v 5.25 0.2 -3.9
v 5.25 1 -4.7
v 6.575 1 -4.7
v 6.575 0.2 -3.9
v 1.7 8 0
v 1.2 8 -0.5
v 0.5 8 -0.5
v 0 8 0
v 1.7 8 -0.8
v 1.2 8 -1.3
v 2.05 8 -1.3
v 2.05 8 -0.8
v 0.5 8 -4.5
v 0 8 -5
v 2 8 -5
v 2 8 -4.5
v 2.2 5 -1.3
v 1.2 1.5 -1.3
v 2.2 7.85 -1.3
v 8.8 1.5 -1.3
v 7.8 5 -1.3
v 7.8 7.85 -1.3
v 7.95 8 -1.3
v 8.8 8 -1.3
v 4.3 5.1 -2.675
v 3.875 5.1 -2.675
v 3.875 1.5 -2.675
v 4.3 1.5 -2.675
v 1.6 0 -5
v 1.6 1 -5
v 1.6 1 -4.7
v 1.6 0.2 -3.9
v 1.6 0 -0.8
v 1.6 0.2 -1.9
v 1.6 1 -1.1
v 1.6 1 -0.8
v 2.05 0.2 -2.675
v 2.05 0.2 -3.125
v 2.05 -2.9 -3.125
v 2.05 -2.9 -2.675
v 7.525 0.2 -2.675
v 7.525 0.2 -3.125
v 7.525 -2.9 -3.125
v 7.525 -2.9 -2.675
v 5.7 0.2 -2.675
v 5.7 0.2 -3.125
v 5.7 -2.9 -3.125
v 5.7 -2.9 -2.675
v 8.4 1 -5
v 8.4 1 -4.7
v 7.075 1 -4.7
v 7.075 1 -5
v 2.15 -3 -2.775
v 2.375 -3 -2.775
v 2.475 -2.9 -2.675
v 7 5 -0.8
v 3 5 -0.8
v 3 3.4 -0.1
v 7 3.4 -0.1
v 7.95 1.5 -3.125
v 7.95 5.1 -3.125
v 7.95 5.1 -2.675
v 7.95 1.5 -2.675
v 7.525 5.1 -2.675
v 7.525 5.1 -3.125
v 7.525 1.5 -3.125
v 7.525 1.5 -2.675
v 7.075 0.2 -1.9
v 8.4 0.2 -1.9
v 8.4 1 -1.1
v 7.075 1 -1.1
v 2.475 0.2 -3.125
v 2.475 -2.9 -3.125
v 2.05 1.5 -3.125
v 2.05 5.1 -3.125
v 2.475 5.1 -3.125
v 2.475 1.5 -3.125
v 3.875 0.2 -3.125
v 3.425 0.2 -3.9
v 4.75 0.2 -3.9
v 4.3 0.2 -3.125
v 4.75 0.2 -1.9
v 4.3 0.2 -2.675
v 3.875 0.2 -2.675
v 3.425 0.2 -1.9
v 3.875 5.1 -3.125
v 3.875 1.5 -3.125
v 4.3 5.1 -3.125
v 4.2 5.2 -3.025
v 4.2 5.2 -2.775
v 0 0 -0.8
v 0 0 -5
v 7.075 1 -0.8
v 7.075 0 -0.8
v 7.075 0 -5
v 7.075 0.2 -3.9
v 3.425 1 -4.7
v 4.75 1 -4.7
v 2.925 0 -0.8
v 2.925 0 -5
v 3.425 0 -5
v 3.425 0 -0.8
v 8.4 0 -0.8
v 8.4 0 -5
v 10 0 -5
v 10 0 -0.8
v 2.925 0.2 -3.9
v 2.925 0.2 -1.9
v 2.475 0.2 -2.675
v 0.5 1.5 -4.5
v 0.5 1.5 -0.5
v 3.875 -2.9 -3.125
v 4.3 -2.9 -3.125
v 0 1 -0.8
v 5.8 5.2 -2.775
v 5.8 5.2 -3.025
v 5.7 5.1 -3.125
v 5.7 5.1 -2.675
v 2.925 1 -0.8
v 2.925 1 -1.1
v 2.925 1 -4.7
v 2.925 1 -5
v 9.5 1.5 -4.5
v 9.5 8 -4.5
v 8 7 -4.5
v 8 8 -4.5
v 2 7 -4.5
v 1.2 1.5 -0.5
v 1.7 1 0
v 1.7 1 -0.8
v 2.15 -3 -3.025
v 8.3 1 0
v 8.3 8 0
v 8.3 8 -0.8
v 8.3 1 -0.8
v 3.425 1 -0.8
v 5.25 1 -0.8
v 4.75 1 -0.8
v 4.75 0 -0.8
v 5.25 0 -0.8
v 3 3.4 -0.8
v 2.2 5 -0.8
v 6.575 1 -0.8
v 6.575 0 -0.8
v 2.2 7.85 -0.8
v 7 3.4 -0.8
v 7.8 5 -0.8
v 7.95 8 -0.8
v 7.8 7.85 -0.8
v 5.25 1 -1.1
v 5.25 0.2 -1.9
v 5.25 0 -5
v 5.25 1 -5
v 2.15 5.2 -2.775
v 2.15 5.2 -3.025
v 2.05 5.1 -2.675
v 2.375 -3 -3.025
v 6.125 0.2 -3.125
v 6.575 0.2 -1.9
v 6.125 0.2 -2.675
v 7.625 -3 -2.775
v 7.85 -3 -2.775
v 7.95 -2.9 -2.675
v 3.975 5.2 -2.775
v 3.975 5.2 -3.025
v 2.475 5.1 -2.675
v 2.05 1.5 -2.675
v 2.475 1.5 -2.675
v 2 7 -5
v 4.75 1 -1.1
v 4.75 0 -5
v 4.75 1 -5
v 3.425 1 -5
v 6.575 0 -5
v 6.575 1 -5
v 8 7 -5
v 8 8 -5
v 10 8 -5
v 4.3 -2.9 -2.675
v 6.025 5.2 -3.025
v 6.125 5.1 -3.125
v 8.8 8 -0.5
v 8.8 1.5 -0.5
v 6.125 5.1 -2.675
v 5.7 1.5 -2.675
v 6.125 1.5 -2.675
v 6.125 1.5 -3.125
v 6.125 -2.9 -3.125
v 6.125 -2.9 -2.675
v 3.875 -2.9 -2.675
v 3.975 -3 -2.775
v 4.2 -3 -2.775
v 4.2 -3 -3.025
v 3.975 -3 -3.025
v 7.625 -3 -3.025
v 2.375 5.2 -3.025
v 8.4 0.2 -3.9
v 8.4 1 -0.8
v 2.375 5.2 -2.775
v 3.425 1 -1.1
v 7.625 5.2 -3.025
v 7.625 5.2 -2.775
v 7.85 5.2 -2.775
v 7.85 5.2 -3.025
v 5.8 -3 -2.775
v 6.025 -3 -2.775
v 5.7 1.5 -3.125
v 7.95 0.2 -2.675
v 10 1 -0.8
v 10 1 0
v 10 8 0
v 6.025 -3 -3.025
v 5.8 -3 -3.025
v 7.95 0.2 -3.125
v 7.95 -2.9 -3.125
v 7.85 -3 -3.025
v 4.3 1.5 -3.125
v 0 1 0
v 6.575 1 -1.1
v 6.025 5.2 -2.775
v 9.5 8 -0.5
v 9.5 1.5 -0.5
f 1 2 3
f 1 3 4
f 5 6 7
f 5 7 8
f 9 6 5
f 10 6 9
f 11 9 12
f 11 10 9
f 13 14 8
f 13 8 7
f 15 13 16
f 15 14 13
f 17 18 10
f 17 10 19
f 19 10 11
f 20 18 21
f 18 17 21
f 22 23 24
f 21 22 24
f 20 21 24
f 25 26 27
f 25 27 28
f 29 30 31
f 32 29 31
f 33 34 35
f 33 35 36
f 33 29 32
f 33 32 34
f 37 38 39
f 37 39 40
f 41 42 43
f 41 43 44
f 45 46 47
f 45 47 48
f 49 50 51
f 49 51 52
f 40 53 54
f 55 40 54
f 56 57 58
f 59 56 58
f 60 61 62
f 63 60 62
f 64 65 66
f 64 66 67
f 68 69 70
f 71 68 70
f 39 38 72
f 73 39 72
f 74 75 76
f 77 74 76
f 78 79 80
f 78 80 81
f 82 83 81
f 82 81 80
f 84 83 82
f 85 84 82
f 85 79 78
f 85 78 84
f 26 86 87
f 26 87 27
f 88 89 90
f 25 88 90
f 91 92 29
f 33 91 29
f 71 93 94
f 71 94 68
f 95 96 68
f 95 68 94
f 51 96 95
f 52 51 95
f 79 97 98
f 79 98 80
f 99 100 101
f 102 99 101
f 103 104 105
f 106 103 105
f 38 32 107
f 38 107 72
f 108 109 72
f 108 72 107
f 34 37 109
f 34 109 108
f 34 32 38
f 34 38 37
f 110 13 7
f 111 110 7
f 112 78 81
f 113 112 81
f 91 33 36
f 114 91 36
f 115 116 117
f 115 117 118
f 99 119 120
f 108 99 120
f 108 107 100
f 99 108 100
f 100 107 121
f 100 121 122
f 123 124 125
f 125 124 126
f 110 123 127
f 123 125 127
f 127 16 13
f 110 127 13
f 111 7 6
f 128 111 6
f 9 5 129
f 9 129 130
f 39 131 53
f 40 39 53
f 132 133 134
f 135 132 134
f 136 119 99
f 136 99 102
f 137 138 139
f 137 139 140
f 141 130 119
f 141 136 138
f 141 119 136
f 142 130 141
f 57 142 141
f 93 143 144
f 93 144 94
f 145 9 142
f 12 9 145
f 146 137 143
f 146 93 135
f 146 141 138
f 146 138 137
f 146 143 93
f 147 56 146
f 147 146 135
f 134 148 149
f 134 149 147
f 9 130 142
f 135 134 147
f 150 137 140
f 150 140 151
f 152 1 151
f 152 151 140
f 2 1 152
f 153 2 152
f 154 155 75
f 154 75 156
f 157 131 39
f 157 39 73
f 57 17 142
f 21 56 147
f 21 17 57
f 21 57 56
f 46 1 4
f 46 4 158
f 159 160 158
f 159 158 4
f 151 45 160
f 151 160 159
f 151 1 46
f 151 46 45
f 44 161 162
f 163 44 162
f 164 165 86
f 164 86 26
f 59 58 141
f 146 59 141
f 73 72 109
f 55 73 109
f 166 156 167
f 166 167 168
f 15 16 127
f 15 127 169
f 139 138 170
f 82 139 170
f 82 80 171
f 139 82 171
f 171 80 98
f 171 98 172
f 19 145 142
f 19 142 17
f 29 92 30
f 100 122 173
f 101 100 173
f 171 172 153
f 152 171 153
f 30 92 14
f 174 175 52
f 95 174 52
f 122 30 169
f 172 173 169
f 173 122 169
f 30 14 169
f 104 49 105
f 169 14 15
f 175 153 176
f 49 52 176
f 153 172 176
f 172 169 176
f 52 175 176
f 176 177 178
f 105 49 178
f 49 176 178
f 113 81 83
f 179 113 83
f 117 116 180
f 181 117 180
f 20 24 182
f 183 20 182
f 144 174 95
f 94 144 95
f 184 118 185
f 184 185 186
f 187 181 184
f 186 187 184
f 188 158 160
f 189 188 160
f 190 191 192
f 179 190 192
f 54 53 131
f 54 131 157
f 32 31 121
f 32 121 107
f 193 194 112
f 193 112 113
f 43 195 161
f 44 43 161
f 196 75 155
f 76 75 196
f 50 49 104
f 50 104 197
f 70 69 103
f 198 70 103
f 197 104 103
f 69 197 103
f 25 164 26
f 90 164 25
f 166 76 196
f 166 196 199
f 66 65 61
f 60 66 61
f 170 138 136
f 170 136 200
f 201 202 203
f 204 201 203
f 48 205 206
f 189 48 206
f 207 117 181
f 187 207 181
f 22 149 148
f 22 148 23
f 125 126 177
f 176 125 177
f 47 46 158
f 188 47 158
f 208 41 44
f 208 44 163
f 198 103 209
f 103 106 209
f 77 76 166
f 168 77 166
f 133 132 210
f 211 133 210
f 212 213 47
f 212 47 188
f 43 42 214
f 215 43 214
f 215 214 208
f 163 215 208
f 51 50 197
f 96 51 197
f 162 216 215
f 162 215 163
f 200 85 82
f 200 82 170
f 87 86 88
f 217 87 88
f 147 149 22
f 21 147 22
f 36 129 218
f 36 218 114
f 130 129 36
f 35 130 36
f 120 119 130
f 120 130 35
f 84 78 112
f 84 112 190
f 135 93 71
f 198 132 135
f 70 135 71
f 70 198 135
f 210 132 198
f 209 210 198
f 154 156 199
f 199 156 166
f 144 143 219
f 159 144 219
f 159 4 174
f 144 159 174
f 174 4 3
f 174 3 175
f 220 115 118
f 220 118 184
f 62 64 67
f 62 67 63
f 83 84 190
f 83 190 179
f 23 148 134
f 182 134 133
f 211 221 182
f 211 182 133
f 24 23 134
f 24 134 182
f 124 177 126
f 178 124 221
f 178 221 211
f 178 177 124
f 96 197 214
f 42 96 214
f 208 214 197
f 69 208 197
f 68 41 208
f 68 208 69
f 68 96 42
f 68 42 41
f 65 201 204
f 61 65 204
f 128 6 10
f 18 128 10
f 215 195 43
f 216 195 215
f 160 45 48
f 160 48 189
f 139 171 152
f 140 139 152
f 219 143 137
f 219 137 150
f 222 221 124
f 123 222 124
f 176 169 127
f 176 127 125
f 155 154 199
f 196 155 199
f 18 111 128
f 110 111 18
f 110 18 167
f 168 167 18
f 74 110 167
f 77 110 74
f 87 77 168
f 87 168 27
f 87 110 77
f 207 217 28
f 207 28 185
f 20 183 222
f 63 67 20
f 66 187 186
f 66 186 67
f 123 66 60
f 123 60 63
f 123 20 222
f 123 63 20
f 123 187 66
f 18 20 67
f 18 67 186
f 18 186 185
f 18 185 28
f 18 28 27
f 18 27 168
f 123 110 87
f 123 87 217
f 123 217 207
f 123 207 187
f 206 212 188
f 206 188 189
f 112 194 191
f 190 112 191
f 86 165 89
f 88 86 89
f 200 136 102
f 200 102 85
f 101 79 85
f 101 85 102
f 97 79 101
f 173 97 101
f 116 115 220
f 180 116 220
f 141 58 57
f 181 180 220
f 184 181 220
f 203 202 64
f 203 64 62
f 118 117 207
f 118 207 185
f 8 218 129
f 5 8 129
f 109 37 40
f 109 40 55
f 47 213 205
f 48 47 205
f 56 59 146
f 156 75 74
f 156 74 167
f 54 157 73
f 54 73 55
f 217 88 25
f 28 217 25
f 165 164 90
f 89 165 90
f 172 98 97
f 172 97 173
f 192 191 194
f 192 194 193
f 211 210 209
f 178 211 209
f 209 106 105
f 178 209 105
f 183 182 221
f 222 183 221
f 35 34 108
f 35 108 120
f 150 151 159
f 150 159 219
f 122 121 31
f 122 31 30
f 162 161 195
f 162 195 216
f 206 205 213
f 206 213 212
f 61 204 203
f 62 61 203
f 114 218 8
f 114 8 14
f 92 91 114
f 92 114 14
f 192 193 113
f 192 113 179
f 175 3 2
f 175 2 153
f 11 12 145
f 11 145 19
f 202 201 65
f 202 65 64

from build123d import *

# Parameters (mm, degrees)
ESQUISSE1_W             = 10
ESQUISSE1_H             = 5
BOSS_EXTRU_1_DEPTH      = 8
ESQUISSE2_W             = 6.6
ESQUISSE2_H             = 0.8
ENL_V_MAT_EXTRU_1_DEPTH = 8
ENL_V_MAT_EXTRU_2_DEPTH = 6.5
ESQUISSE5_W             = 6
ESQUISSE5_H             = 0.5
ENL_V_MAT_EXTRU_3_DEPTH = 1
ESQUISSE6_W             = 5.6
ESQUISSE6_H             = 0.5
ENL_V_MAT_EXTRU_4_DEPTH = 3
ESQUISSE7_W             = 0.8
ESQUISSE7_H             = 1
ENL_V_MAT_EXTRU_5_DEPTH = 10
ESQUISSE8_W             = 6.8
ESQUISSE8_H             = 4.2
ENL_V_MAT_EXTRU_6_DEPTH = 1
BOSS_EXTRU_2_DEPTH      = 6.8
BOSS_EXTRU_3_DEPTH      = 2
BOSS_EXTRU_3_DEPTH_BACK = 2
ESQUISSE12_W            = 0.5
ESQUISSE12_H            = 4.2
BOSS_EXTRU_4_DEPTH      = 1
CHANFREIN1_SIZE         = 0.15
BOSS_EXTRU_5_DEPTH      = 3.2
BOSS_EXTRU_5_DEPTH_BACK = 5
ESQUISSE13_W            = 0.425
ESQUISSE13_H            = 0.45
CHANFREIN2_SIZE         = 0.1


with BuildPart() as part:
    # Esquisse1 → Boss.-Extru.1 (new body)
    with BuildSketch(Plane(origin=(0, 0, 0), x_dir=(1, 0, 0), z_dir=(0, 1, 0))):
        with Locations((5, 2.5)):
            Rectangle(ESQUISSE1_W, ESQUISSE1_H)
    extrude(amount=BOSS_EXTRU_1_DEPTH)

    # Esquisse2 → Enlèv. mat.-Extru.1 (cut)
    with BuildSketch(Plane(origin=(0, 8, 0), x_dir=(1, 0, 0), z_dir=(0, 1, 0))):
        with Locations((5, 0.4)):
            Rectangle(ESQUISSE2_W, ESQUISSE2_H)
    extrude(amount=-ENL_V_MAT_EXTRU_1_DEPTH, mode=Mode.SUBTRACT)

    # Esquisse4 → Enlèv. mat.-Extru.2 (cut)
    with BuildSketch(Plane(origin=(0, 8, 0), x_dir=(1, 0, 0), z_dir=(0, 1, 0))):
        Polygon((0.5, 0.5), (1.2, 0.5), (1.2, 1.3), (8.8, 1.3), (8.8, 0.5), (9.5, 0.5), (9.5, 4.5), (0.5, 4.5), align=None)
    extrude(amount=-ENL_V_MAT_EXTRU_2_DEPTH, mode=Mode.SUBTRACT)

    # Esquisse5 → Enlèv. mat.-Extru.3 (cut)
    with BuildSketch(Plane(origin=(0, 8, 0), x_dir=(1, 0, 0), z_dir=(0, 1, 0))):
        with Locations((5, 4.75)):
            Rectangle(ESQUISSE5_W, ESQUISSE5_H)
    extrude(amount=-ENL_V_MAT_EXTRU_3_DEPTH, mode=Mode.SUBTRACT)

    # Esquisse6 → Enlèv. mat.-Extru.4 (cut)
    with BuildSketch(Plane(origin=(0, 8, 0), x_dir=(1, 0, 0), z_dir=(0, 1, 0))):
        with Locations((5, 1.05)):
            Rectangle(ESQUISSE6_W, ESQUISSE6_H)
    extrude(amount=-ENL_V_MAT_EXTRU_4_DEPTH, mode=Mode.SUBTRACT)

    # Esquisse7 → Enlèv. mat.-Extru.5 (cut)
    with BuildSketch(Plane(origin=(10, 0, 0), x_dir=(0, 0, -1), z_dir=(1, 0, 0))):
        with Locations((0.4, 0.5)):
            Rectangle(ESQUISSE7_W, ESQUISSE7_H)
    extrude(amount=-ENL_V_MAT_EXTRU_5_DEPTH, mode=Mode.SUBTRACT)

    # Esquisse8 → Enlèv. mat.-Extru.6 (cut)
    with BuildSketch(Plane.XZ):
        with Locations((5, -2.9)):
            Rectangle(ESQUISSE8_W, ESQUISSE8_H)
    extrude(amount=-ENL_V_MAT_EXTRU_6_DEPTH, mode=Mode.SUBTRACT)

    # Esquisse9 → Boss.-Extru.2 (add)
    with BuildSketch(Plane(origin=(1.6, 0, 0), x_dir=(0, 0, -1), z_dir=(1, 0, 0))):
        Polygon((4.7, 1), (3.9, 0.2), (1.9, 0.2), (1.1, 1), align=None)
    extrude(amount=BOSS_EXTRU_2_DEPTH)

    # Esquisse11 → Boss.-Extru.3 (add, two sides: drawn at the far end of the back side and taken through both)
    with BuildSketch(Plane(origin=(5, 0, 0), x_dir=(0, 0, -1), z_dir=(1, 0, 0)).offset(-BOSS_EXTRU_3_DEPTH_BACK)):
        Polygon((0.8, 5), (0.1, 3.4), (0.8, 3.4), align=None)
    extrude(amount=BOSS_EXTRU_3_DEPTH + BOSS_EXTRU_3_DEPTH_BACK)

    # Esquisse12 → Boss.-Extru.4 (add)
    with BuildSketch(Plane(origin=(0, 1, 0), x_dir=(1, 0, 0), z_dir=(0, 1, 0))):
        with Locations((5, 2.9)):
            Rectangle(ESQUISSE12_W, ESQUISSE12_H)
        with Locations((3.175, 2.9)):
            Rectangle(ESQUISSE12_W, ESQUISSE12_H)
        with Locations((6.825, 2.9)):
            Rectangle(ESQUISSE12_W, ESQUISSE12_H)
    extrude(amount=-BOSS_EXTRU_4_DEPTH)

    # Chanfrein1
    chanfrein1_edges = [part.edges().sort_by_distance(p)[0] for p in [
        (2.2, 8, -1.05),
        (7.8, 8, -1.05),
    ]]
    chamfer(chanfrein1_edges, length=CHANFREIN1_SIZE)

    # Esquisse13 → Boss.-Extru.5 (add, two sides: drawn at the far end of the back side and taken through both)
    with BuildSketch(Plane.XZ.offset(-0.2).offset(-BOSS_EXTRU_5_DEPTH_BACK)):
        with Locations((2.2625, -2.9)):
            Rectangle(ESQUISSE13_W, ESQUISSE13_H)
        with Locations((4.0875, -2.9)):
            Rectangle(ESQUISSE13_W, ESQUISSE13_H)
        with Locations((5.9125, -2.9)):
            Rectangle(ESQUISSE13_W, ESQUISSE13_H)
        with Locations((7.7375, -2.9)):
            Rectangle(ESQUISSE13_W, ESQUISSE13_H)
    extrude(amount=BOSS_EXTRU_5_DEPTH + BOSS_EXTRU_5_DEPTH_BACK)

    # Chanfrein2
    chanfrein2_edges = [part.edges().sort_by_distance(p)[0] for p in [
        (2.05, 5.2, -2.9),
        (2.2625, 5.2, -2.675),
        (2.475, 5.2, -2.9),
        (2.2625, 5.2, -3.125),
        (2.05, -3, -2.9),
        (2.2625, -3, -3.125),
        (2.475, -3, -2.9),
        (2.2625, -3, -2.675),
        (4.3, 5.2, -2.9),
        (4.0875, 5.2, -3.125),
        (3.875, 5.2, -2.9),
        (4.0875, 5.2, -2.675),
        (4.3, -3, -2.9),
        (4.0875, -3, -2.675),
        (3.875, -3, -2.9),
        (4.0875, -3, -3.125),
        (5.7, 5.2, -2.9),
        (5.9125, 5.2, -2.675),
        (6.125, 5.2, -2.9),
        (5.9125, 5.2, -3.125),
        (5.7, -3, -2.9),
        (5.9125, -3, -3.125),
        (6.125, -3, -2.9),
        (5.9125, -3, -2.675),
        (7.7375, 5.2, -2.675),
        (7.95, 5.2, -2.9),
        (7.7375, 5.2, -3.125),
        (7.525, 5.2, -2.9),
        (7.7375, -3, -2.675),
        (7.525, -3, -2.9),
        (7.7375, -3, -3.125),
        (7.95, -3, -2.9),
    ]]
    chamfer(chanfrein2_edges, length=CHANFREIN2_SIZE)


solid = part.part
